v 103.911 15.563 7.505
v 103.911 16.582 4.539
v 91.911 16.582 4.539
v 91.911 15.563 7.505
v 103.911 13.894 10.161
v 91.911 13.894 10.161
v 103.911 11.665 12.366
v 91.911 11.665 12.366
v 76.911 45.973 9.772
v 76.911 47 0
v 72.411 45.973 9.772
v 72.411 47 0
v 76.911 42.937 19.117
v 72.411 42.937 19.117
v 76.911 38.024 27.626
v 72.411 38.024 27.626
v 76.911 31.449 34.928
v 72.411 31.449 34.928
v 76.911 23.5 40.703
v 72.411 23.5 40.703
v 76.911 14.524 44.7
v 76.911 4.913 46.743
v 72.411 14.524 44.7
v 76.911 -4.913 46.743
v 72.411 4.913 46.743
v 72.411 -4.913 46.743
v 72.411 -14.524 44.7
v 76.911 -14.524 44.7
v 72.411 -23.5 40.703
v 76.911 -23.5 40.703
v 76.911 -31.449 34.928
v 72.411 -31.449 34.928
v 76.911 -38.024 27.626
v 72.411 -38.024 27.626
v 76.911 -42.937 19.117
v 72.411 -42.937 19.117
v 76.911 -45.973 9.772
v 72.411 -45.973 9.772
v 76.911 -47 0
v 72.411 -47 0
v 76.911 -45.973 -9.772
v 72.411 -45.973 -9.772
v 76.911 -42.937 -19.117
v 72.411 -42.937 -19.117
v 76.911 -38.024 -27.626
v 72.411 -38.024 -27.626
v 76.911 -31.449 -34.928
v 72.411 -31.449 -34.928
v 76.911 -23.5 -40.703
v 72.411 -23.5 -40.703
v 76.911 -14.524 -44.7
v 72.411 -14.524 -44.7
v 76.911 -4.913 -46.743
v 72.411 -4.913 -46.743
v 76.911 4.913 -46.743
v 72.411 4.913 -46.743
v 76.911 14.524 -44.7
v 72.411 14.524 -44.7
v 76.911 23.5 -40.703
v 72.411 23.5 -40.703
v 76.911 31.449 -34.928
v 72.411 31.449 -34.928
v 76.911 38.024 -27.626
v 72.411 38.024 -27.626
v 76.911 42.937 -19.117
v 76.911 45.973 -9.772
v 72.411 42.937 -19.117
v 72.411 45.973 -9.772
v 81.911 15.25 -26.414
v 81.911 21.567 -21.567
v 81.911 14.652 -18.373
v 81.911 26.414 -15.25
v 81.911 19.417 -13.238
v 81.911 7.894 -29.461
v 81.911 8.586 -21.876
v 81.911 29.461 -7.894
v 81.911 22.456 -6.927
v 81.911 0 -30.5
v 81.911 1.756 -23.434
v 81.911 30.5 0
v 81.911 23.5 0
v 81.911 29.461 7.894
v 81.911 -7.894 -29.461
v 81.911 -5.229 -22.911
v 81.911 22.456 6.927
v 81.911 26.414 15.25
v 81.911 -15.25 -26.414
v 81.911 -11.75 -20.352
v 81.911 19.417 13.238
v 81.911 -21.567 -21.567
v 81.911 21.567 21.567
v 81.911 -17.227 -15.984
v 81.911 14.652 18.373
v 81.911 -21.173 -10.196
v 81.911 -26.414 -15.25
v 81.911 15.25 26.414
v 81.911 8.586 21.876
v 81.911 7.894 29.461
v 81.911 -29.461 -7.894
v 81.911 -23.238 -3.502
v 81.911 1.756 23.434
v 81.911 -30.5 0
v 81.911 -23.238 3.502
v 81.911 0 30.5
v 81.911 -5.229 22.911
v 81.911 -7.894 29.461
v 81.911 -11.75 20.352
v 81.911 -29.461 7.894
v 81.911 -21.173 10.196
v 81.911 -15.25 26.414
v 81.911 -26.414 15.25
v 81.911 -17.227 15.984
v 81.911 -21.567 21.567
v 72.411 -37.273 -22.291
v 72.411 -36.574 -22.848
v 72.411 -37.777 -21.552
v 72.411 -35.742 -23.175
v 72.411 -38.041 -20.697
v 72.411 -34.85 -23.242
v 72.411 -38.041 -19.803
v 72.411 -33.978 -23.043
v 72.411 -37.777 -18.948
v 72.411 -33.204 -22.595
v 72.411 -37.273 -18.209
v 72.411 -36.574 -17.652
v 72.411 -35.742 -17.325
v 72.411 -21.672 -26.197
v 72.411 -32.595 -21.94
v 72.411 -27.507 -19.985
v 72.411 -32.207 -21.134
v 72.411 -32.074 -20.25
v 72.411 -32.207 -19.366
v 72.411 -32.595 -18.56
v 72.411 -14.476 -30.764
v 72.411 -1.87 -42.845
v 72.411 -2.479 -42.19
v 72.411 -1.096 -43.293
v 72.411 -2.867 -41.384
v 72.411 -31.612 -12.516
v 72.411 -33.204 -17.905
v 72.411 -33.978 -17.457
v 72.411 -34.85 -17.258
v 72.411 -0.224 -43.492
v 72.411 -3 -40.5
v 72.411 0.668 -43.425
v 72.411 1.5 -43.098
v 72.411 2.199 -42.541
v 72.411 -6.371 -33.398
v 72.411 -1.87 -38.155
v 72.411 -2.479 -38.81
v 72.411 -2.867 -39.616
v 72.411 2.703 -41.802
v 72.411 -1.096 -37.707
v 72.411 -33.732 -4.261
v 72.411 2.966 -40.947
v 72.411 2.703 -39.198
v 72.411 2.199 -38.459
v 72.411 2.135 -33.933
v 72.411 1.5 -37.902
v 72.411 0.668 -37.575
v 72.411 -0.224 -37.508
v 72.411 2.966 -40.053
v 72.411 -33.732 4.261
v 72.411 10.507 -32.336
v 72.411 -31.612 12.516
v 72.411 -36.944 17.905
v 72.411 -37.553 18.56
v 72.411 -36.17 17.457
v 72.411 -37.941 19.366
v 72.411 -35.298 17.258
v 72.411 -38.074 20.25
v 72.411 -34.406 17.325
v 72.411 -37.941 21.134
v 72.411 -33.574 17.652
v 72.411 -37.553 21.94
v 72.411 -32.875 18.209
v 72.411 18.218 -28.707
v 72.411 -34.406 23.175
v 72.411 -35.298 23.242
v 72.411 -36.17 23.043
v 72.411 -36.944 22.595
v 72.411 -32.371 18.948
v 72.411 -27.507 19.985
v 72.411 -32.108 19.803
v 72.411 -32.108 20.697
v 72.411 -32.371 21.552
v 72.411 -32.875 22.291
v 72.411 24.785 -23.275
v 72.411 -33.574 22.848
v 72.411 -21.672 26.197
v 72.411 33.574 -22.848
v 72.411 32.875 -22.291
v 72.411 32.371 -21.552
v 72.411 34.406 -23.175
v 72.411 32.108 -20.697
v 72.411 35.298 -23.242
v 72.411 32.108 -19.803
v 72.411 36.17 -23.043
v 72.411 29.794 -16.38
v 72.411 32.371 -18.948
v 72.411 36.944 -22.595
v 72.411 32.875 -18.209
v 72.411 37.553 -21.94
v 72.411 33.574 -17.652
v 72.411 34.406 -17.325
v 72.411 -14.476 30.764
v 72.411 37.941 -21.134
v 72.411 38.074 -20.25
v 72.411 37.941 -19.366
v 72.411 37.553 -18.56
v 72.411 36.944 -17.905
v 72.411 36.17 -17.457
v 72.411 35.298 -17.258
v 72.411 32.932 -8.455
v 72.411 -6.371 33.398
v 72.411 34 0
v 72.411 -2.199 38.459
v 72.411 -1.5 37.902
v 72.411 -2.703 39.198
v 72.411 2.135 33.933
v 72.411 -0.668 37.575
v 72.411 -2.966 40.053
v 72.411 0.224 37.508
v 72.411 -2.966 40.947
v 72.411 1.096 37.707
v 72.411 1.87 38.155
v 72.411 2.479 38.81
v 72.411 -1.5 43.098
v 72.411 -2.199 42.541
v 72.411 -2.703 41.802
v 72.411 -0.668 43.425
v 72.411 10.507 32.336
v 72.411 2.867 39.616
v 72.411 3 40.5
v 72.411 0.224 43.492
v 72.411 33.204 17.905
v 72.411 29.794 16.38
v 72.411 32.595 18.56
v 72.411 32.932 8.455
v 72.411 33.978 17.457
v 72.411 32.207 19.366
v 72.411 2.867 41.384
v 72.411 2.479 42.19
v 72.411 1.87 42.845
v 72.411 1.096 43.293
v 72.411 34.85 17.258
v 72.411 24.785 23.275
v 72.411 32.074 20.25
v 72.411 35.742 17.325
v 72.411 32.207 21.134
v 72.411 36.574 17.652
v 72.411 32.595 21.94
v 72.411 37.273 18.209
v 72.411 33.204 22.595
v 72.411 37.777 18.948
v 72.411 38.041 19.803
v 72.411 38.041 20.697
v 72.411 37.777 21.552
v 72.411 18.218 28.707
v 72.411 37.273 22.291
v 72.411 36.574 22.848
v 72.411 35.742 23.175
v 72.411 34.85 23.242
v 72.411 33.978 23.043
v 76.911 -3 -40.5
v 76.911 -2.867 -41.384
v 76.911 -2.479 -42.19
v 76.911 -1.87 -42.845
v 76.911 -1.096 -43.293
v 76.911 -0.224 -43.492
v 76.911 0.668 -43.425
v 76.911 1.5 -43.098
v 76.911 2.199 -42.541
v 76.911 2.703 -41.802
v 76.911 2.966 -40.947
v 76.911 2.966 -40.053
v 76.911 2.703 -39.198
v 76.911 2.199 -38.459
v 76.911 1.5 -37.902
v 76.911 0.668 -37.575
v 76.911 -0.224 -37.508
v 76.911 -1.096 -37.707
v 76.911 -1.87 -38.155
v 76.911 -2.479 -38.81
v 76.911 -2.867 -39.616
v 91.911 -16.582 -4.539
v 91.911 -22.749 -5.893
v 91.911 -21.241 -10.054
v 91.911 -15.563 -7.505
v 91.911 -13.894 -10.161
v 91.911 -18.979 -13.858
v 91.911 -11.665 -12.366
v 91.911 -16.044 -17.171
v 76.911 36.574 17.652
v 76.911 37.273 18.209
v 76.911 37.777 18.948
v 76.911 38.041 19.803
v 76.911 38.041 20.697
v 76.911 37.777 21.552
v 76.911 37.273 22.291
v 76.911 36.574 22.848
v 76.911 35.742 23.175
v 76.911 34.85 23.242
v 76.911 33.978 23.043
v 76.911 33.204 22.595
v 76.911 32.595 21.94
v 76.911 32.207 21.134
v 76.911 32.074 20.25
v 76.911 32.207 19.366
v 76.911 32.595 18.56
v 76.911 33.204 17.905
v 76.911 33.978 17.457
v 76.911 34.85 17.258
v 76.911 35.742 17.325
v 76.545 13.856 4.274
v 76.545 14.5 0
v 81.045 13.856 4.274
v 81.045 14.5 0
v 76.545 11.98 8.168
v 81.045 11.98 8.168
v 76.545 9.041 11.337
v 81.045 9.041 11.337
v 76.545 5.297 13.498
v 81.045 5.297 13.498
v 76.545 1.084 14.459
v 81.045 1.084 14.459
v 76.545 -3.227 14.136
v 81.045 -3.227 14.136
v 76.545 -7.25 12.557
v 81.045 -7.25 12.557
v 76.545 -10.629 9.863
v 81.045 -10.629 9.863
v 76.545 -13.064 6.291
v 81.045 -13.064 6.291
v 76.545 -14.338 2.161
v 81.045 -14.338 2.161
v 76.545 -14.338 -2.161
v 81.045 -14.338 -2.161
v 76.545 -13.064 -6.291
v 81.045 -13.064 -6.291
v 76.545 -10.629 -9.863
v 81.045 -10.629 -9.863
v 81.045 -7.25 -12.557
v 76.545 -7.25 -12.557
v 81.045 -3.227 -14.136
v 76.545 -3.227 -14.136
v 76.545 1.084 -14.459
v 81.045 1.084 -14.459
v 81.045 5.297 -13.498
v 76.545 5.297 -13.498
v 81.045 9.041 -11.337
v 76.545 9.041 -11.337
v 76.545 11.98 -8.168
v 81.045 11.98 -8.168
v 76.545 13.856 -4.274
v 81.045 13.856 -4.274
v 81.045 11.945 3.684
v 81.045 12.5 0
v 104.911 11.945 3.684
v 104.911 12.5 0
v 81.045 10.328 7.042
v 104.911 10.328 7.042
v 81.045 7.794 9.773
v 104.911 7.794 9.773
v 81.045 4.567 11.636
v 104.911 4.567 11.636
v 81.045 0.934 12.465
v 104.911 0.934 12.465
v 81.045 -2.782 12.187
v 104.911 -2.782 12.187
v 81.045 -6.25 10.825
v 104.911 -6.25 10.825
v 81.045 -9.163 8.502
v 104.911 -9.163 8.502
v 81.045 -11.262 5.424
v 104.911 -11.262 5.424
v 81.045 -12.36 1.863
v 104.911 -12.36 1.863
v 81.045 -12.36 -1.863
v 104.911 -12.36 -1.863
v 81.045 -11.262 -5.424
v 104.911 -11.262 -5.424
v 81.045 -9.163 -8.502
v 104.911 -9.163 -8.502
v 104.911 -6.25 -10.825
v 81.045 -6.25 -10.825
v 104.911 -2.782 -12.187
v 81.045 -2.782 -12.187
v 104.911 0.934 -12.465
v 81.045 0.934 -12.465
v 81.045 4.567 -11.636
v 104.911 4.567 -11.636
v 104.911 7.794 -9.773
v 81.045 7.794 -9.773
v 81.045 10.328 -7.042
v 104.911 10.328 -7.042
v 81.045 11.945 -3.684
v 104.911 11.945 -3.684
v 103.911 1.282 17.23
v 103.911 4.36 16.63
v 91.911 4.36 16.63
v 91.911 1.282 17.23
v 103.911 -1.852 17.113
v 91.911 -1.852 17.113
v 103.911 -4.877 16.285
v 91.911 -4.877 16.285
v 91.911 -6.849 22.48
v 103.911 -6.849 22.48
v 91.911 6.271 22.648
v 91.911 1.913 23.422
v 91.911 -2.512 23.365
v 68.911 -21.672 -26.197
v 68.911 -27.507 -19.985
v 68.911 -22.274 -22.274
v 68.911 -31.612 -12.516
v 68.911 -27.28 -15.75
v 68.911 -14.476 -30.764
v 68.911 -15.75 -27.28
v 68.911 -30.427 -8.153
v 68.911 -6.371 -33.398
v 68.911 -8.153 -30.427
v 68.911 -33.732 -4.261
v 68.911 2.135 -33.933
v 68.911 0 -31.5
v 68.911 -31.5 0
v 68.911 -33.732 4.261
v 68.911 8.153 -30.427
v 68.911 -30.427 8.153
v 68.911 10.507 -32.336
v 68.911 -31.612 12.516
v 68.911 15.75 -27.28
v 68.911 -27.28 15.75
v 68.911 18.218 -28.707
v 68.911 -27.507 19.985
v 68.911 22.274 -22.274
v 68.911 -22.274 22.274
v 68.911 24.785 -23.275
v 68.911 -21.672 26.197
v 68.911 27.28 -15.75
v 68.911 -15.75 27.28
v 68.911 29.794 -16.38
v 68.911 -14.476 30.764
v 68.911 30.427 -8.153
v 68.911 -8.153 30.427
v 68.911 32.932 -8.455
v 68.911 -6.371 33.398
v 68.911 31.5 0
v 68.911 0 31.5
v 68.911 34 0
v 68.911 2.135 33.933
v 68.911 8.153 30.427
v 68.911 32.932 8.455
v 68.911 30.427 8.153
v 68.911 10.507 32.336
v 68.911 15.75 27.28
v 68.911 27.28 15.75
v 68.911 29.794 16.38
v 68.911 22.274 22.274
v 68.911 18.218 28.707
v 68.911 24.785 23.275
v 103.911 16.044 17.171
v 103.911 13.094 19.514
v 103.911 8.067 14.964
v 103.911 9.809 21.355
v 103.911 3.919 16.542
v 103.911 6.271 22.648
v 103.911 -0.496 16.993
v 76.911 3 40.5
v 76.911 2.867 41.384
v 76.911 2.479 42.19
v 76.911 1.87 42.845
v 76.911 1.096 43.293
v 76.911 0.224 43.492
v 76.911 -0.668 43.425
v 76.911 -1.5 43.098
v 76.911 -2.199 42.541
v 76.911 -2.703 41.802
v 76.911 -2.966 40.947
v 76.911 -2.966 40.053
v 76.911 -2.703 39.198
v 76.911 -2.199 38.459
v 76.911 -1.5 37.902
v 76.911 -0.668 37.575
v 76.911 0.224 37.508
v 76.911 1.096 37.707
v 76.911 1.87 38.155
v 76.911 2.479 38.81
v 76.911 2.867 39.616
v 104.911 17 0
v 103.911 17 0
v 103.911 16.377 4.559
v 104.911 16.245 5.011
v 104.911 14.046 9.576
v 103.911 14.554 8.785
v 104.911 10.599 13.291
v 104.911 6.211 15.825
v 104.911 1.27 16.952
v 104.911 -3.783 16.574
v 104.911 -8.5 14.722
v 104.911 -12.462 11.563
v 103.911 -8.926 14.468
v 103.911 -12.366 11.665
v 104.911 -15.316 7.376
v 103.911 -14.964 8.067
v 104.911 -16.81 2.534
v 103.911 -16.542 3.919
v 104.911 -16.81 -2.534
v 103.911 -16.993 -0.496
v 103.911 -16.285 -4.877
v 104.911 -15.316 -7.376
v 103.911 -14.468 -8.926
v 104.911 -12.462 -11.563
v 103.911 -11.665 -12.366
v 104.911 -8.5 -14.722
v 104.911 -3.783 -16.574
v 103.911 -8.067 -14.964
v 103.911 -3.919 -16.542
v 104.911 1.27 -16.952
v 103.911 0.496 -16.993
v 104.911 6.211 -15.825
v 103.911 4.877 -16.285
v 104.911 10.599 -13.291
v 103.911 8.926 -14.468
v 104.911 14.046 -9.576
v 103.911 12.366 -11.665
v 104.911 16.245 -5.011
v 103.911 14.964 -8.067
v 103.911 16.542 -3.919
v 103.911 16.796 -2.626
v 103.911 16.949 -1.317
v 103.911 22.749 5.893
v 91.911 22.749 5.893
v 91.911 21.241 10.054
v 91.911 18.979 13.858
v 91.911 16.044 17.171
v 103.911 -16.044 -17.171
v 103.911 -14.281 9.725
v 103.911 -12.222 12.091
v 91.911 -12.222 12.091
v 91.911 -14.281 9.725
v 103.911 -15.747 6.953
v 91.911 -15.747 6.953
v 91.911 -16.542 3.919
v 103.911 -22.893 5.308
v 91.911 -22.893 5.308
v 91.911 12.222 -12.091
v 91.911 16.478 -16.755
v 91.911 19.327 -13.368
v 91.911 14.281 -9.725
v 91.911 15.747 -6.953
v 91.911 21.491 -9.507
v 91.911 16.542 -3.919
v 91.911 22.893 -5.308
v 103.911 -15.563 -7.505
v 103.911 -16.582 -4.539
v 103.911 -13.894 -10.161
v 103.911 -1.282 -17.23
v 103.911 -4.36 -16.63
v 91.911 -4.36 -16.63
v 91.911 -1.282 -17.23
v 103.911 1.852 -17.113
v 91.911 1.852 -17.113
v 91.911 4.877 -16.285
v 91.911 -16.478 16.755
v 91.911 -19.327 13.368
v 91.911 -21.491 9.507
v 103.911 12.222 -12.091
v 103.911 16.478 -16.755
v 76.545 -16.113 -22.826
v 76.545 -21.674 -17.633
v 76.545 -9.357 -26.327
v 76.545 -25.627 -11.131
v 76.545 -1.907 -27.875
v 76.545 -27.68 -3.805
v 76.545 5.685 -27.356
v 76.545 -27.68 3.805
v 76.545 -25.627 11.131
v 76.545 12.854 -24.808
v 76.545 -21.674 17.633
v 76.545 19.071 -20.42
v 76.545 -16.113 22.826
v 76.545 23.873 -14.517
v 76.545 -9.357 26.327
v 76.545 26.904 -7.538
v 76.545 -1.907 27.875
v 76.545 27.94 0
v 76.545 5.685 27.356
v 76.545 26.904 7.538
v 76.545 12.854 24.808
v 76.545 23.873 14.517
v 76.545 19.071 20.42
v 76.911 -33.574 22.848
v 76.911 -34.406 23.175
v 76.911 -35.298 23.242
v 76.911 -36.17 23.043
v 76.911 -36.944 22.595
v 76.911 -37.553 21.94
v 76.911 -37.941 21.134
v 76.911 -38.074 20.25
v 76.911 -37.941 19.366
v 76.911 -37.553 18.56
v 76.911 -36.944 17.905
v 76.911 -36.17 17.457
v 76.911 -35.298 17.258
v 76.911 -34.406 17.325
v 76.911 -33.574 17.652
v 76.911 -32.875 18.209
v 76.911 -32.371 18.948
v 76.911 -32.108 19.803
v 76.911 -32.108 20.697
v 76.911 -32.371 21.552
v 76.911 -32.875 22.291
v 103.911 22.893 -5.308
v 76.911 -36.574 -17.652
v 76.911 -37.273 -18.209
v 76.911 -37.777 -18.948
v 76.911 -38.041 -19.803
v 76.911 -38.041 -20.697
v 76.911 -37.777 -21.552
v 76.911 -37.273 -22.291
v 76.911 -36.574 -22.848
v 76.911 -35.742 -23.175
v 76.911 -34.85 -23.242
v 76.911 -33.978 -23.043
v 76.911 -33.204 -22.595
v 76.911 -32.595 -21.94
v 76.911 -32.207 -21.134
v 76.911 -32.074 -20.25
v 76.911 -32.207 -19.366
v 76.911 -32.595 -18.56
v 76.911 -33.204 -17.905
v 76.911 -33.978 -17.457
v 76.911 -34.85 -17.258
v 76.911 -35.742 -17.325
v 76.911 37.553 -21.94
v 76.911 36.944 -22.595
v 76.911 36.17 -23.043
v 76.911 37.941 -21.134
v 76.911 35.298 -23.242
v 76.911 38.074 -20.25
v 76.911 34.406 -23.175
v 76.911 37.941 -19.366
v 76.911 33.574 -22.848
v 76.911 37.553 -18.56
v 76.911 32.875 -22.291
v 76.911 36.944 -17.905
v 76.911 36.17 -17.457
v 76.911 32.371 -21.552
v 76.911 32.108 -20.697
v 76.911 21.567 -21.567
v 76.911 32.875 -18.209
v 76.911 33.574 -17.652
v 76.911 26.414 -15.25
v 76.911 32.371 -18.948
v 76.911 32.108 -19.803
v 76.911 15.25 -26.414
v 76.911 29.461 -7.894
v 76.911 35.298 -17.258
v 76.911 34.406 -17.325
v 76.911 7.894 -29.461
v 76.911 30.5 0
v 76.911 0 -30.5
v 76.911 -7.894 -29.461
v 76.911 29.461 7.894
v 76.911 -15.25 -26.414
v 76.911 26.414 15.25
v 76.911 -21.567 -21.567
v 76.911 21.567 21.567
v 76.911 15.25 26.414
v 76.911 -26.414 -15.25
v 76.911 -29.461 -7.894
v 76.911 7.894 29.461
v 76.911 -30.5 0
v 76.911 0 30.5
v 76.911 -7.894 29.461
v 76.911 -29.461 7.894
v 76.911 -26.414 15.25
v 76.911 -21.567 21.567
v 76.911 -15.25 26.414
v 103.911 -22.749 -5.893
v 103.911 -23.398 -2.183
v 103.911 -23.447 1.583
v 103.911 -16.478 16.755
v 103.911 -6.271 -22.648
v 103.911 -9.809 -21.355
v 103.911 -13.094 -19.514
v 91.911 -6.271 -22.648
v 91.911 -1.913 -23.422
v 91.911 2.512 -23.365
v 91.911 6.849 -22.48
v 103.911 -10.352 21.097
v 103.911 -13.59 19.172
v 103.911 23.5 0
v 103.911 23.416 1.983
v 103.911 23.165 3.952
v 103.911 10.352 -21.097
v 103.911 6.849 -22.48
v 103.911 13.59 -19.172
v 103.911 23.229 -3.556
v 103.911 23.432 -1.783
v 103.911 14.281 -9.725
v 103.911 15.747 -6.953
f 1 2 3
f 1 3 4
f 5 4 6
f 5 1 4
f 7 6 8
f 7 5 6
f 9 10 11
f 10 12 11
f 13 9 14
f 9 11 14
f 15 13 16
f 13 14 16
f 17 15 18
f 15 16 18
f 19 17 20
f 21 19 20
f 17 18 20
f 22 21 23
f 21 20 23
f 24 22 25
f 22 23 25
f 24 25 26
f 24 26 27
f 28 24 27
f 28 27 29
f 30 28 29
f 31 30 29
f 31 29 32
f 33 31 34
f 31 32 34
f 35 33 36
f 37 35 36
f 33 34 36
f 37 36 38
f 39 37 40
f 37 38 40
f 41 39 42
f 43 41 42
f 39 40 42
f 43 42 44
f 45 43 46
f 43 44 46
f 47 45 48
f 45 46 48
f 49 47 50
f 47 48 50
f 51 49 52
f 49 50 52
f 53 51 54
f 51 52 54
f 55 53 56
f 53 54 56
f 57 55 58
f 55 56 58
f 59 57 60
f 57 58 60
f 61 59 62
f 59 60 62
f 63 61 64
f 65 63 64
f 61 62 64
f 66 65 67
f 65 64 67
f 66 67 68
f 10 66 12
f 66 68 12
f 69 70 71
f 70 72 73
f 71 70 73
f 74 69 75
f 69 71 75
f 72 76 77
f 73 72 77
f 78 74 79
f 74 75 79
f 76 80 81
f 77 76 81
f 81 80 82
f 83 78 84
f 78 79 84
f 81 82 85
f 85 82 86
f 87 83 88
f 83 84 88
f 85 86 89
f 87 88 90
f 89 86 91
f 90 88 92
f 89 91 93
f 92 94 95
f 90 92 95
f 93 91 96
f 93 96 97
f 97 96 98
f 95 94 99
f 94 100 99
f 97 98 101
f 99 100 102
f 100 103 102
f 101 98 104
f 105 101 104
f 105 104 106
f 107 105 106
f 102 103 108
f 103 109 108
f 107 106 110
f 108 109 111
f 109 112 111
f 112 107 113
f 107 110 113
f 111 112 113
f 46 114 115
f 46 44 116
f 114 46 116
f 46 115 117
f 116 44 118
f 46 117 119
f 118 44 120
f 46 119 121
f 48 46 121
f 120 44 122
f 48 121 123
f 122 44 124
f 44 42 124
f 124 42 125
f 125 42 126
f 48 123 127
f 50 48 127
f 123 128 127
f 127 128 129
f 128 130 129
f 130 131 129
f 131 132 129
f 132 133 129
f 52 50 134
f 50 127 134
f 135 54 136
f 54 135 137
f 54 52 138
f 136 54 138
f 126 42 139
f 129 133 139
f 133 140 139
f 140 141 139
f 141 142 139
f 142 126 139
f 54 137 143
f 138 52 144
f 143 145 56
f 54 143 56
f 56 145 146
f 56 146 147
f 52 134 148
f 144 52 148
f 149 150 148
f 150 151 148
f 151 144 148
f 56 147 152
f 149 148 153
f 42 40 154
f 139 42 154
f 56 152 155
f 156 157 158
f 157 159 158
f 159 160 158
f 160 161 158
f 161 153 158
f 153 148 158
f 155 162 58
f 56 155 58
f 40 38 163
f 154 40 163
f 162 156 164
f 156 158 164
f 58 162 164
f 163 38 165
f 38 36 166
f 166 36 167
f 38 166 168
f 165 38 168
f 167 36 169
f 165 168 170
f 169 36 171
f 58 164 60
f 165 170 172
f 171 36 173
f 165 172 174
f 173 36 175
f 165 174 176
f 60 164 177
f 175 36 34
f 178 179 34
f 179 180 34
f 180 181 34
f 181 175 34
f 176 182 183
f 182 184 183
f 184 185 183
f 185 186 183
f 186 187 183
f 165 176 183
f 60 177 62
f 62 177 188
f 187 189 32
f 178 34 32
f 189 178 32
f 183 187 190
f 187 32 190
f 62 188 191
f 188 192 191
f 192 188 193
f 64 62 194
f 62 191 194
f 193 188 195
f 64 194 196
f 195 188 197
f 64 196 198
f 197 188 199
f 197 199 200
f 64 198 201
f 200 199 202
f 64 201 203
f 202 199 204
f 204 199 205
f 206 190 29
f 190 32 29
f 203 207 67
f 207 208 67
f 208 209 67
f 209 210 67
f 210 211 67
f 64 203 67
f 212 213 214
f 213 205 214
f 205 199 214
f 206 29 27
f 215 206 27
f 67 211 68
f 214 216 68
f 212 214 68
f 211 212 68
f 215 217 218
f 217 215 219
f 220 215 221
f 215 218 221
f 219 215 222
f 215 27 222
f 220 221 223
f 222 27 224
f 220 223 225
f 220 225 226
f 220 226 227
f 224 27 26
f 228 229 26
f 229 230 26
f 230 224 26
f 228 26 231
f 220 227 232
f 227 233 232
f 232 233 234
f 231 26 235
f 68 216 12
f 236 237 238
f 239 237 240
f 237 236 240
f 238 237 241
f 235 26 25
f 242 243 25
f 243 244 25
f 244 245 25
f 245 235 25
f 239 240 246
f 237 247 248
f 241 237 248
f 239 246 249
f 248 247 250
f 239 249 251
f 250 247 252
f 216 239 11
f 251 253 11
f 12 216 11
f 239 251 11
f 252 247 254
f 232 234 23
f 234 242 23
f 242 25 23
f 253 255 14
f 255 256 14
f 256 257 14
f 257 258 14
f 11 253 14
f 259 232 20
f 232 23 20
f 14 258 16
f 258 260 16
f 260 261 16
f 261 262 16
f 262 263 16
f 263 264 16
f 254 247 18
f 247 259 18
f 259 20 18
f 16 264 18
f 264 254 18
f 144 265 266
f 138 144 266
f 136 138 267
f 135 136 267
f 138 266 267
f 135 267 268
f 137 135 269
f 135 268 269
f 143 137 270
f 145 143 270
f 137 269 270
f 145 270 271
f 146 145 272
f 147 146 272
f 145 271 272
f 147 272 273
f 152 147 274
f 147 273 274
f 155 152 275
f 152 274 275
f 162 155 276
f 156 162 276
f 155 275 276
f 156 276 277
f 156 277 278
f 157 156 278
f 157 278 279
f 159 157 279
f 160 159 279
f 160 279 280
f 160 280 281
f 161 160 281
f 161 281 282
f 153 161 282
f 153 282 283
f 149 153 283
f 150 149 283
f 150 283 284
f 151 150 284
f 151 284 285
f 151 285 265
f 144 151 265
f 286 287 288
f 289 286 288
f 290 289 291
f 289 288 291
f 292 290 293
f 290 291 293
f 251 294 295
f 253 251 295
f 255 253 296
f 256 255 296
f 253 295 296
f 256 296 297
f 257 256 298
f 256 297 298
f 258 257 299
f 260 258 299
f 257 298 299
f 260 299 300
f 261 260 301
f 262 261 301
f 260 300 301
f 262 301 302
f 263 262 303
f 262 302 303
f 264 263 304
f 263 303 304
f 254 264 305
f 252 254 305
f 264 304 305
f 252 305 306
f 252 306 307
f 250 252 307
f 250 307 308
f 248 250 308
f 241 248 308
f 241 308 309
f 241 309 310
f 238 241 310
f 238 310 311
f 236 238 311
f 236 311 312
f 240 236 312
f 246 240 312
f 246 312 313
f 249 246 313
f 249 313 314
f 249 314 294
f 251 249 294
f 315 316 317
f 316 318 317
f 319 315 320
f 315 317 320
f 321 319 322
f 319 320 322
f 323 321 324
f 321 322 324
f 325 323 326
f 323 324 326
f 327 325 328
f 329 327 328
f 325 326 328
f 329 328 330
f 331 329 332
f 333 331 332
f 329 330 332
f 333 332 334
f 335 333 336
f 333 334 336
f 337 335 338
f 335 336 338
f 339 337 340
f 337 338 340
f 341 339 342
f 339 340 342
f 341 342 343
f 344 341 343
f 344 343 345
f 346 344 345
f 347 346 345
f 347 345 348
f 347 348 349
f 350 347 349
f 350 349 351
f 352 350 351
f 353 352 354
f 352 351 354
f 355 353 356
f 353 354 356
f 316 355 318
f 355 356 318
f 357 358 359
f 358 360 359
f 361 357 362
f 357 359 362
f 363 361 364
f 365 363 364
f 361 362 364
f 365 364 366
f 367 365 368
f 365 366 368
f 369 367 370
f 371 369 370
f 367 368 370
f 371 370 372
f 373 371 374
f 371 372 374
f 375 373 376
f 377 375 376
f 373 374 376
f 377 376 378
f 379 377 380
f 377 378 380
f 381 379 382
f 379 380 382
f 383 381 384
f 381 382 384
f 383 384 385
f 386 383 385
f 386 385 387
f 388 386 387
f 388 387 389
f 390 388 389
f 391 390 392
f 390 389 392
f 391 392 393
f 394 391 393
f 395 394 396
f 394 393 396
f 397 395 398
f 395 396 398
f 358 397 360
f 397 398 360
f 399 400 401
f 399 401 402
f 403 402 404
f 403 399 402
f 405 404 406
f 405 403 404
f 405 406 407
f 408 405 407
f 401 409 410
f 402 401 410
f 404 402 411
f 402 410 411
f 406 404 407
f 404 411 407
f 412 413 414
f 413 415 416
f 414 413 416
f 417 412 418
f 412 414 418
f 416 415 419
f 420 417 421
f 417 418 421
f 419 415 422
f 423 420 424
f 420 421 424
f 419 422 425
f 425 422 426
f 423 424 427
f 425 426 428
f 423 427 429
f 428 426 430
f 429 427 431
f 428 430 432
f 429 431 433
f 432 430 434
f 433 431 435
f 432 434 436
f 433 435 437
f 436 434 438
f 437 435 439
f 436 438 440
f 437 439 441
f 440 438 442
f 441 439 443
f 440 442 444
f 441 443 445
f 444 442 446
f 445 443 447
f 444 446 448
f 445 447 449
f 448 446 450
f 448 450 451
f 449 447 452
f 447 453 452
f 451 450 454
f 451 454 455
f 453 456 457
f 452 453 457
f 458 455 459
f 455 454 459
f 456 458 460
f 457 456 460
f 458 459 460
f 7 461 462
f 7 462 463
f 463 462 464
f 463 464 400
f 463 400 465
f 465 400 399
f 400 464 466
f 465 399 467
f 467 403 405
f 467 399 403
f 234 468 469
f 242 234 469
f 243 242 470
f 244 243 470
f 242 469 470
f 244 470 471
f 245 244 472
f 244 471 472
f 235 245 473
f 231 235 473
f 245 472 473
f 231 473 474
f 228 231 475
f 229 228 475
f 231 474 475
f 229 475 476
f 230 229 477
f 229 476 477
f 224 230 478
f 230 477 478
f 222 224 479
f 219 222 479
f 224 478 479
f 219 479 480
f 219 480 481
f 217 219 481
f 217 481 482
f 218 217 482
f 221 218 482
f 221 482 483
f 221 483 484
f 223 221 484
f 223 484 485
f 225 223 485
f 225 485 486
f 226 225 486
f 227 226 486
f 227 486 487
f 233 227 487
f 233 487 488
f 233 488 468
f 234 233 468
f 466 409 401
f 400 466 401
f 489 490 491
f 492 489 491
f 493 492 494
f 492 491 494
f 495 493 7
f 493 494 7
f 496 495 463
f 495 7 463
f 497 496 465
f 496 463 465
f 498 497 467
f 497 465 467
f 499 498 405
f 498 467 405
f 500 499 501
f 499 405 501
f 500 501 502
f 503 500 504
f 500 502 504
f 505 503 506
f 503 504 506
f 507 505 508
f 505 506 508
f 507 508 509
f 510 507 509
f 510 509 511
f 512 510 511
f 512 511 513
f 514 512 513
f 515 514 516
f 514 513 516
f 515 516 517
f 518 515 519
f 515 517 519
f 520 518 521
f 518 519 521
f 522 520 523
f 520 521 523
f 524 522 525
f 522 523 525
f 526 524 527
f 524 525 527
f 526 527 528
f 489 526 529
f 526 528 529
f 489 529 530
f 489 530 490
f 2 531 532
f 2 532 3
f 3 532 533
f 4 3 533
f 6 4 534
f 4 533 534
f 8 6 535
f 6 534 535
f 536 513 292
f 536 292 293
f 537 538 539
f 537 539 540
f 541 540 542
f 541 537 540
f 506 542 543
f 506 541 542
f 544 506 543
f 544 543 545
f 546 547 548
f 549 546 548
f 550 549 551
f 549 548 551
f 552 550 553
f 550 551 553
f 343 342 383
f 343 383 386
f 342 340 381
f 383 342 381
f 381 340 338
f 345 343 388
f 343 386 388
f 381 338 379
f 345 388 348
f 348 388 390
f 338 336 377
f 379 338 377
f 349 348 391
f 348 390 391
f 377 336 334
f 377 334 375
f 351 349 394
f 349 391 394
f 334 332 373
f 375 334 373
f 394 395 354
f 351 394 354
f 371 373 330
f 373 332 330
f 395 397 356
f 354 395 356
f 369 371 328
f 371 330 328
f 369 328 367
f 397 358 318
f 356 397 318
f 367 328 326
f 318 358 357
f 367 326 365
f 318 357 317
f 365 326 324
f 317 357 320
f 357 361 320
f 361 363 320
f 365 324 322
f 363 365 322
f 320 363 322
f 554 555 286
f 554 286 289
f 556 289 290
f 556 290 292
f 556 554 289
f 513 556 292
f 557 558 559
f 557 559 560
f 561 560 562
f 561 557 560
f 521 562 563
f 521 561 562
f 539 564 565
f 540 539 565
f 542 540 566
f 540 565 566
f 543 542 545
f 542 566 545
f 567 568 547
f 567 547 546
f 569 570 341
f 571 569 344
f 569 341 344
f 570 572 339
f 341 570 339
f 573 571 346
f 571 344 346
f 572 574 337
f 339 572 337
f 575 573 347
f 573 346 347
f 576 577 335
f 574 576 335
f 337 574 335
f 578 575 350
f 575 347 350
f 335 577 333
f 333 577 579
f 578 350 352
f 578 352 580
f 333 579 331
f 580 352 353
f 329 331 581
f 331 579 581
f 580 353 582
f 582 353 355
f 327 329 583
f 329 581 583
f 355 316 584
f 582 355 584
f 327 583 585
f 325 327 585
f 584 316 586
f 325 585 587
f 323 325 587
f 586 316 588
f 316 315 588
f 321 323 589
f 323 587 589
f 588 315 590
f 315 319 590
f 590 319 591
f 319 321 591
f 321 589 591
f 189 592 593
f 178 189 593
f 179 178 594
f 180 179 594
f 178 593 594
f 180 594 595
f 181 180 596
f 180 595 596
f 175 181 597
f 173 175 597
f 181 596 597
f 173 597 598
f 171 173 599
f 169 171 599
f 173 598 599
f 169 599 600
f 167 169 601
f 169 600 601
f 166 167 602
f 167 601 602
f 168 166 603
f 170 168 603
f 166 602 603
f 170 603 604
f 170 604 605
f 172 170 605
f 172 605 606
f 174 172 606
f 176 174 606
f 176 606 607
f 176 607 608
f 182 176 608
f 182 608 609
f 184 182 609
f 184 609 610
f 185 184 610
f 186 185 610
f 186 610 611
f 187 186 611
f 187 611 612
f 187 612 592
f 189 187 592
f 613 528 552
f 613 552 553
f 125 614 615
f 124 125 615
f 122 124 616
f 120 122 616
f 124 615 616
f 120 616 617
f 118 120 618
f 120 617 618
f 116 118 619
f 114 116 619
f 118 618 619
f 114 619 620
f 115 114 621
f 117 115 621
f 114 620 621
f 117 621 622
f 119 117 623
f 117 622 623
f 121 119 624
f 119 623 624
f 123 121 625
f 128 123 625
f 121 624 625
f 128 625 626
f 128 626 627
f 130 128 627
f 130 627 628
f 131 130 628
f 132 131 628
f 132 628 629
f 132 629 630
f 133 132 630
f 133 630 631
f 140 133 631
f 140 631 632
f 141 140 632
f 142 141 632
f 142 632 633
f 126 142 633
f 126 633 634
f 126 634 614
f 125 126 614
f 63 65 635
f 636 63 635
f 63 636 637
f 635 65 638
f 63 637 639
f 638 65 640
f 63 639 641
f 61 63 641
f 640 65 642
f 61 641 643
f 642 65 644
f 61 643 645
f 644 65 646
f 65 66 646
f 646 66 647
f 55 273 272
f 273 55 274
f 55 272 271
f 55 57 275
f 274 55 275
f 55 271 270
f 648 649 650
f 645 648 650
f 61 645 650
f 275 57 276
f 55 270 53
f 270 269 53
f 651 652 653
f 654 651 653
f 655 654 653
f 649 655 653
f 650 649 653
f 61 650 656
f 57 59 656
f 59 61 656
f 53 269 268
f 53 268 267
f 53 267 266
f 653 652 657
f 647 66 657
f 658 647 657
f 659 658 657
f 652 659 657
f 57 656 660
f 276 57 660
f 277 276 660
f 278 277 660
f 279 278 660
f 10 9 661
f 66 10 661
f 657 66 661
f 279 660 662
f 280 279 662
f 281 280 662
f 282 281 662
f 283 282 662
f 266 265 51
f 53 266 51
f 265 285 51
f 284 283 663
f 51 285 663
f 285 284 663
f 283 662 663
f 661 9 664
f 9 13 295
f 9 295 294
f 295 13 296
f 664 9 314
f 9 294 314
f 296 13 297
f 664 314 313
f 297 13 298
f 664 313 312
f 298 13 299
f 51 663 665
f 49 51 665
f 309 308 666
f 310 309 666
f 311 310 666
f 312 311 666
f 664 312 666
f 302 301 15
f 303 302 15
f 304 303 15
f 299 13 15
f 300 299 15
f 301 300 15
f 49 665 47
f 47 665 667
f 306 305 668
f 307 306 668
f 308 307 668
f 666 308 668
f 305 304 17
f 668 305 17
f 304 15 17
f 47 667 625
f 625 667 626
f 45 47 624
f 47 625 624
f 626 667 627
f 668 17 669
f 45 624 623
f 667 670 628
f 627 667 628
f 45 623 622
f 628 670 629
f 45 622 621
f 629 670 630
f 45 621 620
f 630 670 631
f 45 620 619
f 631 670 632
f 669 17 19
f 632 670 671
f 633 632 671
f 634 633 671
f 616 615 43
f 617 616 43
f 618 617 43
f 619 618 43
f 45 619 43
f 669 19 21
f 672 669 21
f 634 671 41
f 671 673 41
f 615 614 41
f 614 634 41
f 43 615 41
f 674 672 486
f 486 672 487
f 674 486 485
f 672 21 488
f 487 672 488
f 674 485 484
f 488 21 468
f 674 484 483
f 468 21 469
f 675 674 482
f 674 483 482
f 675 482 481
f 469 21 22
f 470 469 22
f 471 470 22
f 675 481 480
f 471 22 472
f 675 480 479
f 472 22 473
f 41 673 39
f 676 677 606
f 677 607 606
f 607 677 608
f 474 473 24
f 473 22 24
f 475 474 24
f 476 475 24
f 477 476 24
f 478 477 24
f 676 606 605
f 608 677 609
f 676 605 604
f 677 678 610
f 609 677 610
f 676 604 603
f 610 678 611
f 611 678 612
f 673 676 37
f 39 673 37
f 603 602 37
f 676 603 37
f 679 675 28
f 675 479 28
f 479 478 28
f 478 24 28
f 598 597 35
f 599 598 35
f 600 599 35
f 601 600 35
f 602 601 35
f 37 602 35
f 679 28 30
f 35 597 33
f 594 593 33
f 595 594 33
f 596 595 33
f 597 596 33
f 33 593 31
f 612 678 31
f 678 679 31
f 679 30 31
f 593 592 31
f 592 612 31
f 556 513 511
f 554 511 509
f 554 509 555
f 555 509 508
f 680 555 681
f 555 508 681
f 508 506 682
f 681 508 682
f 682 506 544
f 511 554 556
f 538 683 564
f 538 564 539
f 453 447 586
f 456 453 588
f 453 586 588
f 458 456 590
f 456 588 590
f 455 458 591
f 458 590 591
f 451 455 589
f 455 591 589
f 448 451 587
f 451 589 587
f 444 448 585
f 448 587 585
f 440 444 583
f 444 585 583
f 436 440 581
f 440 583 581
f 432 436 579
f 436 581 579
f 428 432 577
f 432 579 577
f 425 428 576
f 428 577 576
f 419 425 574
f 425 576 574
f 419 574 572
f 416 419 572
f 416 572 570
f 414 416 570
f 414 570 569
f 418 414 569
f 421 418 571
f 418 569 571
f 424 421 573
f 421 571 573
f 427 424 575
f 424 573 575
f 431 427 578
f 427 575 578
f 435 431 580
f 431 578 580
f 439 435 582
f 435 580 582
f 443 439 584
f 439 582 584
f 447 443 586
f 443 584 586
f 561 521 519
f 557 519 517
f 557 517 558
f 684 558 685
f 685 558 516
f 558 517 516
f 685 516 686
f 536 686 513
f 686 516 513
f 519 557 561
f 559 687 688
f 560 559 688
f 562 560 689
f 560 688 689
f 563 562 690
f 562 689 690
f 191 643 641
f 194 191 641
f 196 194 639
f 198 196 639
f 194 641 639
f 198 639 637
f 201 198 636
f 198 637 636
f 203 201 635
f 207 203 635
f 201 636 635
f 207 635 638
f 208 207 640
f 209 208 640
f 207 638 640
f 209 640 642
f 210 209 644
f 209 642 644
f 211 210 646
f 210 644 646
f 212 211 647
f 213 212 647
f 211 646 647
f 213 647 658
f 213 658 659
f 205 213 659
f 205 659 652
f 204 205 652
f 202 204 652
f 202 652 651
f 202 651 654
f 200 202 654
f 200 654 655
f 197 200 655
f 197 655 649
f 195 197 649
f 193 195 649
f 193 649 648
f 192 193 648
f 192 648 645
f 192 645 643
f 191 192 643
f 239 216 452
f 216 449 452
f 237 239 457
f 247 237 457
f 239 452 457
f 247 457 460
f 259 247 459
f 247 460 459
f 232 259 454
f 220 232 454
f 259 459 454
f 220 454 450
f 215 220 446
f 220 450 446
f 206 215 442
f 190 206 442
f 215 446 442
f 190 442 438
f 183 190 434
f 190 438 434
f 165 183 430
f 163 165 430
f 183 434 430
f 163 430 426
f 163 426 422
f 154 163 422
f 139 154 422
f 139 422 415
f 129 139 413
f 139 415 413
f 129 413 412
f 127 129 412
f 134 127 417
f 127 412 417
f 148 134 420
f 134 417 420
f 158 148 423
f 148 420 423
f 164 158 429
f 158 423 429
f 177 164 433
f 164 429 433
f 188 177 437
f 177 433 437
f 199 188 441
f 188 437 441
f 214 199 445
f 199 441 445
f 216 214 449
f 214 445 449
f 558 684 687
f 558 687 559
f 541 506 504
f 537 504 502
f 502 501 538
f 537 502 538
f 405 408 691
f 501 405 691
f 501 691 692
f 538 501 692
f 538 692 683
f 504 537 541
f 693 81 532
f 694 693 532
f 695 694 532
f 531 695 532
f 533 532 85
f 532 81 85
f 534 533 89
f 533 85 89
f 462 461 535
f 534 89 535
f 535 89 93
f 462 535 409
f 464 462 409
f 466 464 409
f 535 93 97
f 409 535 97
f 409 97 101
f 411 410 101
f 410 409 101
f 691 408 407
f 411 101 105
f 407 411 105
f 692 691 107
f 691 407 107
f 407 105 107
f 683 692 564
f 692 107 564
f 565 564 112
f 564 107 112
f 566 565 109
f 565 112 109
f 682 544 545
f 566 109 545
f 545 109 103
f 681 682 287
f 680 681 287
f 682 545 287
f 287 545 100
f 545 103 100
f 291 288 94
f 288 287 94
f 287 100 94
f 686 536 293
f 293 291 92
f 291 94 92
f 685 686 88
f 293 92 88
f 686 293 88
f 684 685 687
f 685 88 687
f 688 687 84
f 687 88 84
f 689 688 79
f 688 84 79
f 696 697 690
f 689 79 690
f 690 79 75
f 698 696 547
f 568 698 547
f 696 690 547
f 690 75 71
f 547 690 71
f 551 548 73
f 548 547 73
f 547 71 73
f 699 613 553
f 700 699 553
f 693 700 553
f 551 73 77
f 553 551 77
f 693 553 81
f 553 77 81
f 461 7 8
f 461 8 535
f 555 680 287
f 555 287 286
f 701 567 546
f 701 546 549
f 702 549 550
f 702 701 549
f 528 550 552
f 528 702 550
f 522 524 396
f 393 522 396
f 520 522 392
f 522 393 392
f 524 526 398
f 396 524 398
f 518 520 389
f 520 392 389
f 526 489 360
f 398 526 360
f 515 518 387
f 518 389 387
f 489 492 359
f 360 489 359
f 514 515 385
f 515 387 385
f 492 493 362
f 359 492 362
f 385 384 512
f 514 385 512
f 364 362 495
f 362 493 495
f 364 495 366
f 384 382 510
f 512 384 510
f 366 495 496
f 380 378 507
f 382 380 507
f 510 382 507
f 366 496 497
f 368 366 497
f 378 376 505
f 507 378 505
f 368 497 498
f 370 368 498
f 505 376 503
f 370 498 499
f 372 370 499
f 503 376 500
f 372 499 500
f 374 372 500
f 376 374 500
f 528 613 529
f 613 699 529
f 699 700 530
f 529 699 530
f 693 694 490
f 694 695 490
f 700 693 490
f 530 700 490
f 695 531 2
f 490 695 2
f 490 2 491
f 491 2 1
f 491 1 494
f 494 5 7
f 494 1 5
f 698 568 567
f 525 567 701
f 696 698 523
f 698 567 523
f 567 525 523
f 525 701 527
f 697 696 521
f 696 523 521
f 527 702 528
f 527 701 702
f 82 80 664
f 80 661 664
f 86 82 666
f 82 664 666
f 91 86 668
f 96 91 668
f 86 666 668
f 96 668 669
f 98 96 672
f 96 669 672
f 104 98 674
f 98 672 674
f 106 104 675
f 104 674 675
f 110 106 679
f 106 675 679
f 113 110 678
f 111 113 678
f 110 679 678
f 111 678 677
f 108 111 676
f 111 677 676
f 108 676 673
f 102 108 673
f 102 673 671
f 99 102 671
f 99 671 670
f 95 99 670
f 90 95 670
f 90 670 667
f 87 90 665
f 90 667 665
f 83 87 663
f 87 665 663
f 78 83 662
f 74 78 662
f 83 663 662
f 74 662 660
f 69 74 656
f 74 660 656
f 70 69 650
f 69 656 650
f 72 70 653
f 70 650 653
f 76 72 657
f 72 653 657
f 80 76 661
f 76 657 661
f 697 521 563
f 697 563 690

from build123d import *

# Parameters (mm, degrees)
SKETCH002_R           = 3
POCKET_DEPTH          = 283.449725
POLARPATTERN_COUNT    = 6
POCKET001_DEPTH       = 5
POCKET002_DEPTH       = 5
POCKET003_DEPTH       = 5
POCKET004_DEPTH       = 13
POCKET005_DEPTH       = 13
POLARPATTERN001_COUNT = 6


with BuildPart() as part:
    # Sketch → Revolution (revolve)
    with BuildSketch(Plane.XY):
        Polygon((68.911188, 34), (68.911188, 31.5), (76.544998, 27.940296), (76.544998, 14.5), (81.044998, 14.5), (81.044998, 12.5), (104.911188, 12.5), (104.911188, 17), (103.911188, 17), (103.911188, 23.5), (81.911188, 23.5), (81.911188, 30.5), (76.911188, 30.5), (76.911188, 47), (72.411188, 47), (72.411188, 34), align=None)
    revolve(axis=Axis((0, 0, 0), (1, 0, 0)))

    # Sketch002 (on Face13 of Revolution) → Pocket (cut, through all)
    with BuildSketch(Plane.YZ.offset(76.911188)):
        with Locations((0, 40.5)):
            Circle(SKETCH002_R)
    pocket = extrude(amount=-POCKET_DEPTH, mode=Mode.SUBTRACT)

    # PolarPattern: Pocket ×6 about axis
    polarpattern_axis = Axis((76.911188, 0, 0), (1, 0, 0))
    for i in range(1, POLARPATTERN_COUNT):
        add(pocket.rotate(polarpattern_axis, i * 360 / POLARPATTERN_COUNT), mode=Mode.SUBTRACT)

    # Sketch006 (on Face19 of PolarPattern) → Pocket001 (cut)
    with BuildSketch(Plane.YZ.offset(104.911188)):
        with BuildLine():
            Line((-4.87718, 16.285365), (-6.849063, 22.479776))
            ThreePointArc((6.271238, 22.647772), (-0.30141, 23.53977), (-6.849063, 22.479776))
            Line((6.271238, 22.647772), (4.359747, 16.63002))
            ThreePointArc((4.359747, 16.63002), (-0.288728, 17.262036), (-4.87718, 16.285365))
        make_face()
    extrude(amount=-POCKET001_DEPTH, mode=Mode.SUBTRACT)

    # Sketch006 (on Face19 of PolarPattern) → Pocket002 (cut)
    with BuildSketch(Plane.YZ.offset(104.911188)):
        with BuildLine():
            Line((-4.87718, 16.285365), (-6.849063, 22.479776))
            ThreePointArc((6.271238, 22.647772), (-0.30141, 23.53977), (-6.849063, 22.479776))
            Line((6.271238, 22.647772), (4.359747, 16.63002))
            ThreePointArc((4.359747, 16.63002), (-0.288728, 17.262036), (-4.87718, 16.285365))
        make_face()
    extrude(amount=-POCKET002_DEPTH, mode=Mode.SUBTRACT)

    # Sketch006 (on Face19 of PolarPattern) → Pocket003 (cut)
    with BuildSketch(Plane.YZ.offset(104.911188)):
        with BuildLine():
            Line((-4.87718, 16.285365), (-6.849063, 22.479776))
            ThreePointArc((6.271238, 22.647772), (-0.30141, 23.53977), (-6.849063, 22.479776))
            Line((6.271238, 22.647772), (4.359747, 16.63002))
            ThreePointArc((4.359747, 16.63002), (-0.288728, 17.262036), (-4.87718, 16.285365))
        make_face()
    extrude(amount=-POCKET003_DEPTH, mode=Mode.SUBTRACT)

    # Sketch006 (on Face19 of PolarPattern) → Pocket004 (cut)
    with BuildSketch(Plane.YZ.offset(104.911188)):
        with BuildLine():
            Line((-4.87718, 16.285365), (-6.849063, 22.479776))
            ThreePointArc((6.271238, 22.647772), (-0.30141, 23.53977), (-6.849063, 22.479776))
            Line((6.271238, 22.647772), (4.359747, 16.63002))
            ThreePointArc((4.359747, 16.63002), (-0.288728, 17.262036), (-4.87718, 16.285365))
        make_face()
    extrude(amount=-POCKET004_DEPTH, mode=Mode.SUBTRACT)

    # Sketch006 (on Face19 of PolarPattern) → Pocket005 (cut)
    with BuildSketch(Plane.YZ.offset(104.911188)):
        with BuildLine():
            Line((-4.87718, 16.285365), (-6.849063, 22.479776))
            ThreePointArc((6.271238, 22.647772), (-0.30141, 23.53977), (-6.849063, 22.479776))
            Line((6.271238, 22.647772), (4.359747, 16.63002))
            ThreePointArc((4.359747, 16.63002), (-0.288728, 17.262036), (-4.87718, 16.285365))
        make_face()
    pocket005 = extrude(amount=-POCKET005_DEPTH, mode=Mode.SUBTRACT)

    # PolarPattern001: Pocket005 ×6 about axis
    polarpattern001_axis = Axis((104.911188, 0, 0), (1, 0, 0))
    for i in range(1, POLARPATTERN001_COUNT):
        add(pocket005.rotate(polarpattern001_axis, i * 360 / POLARPATTERN001_COUNT), mode=Mode.SUBTRACT)


solid = part.part
